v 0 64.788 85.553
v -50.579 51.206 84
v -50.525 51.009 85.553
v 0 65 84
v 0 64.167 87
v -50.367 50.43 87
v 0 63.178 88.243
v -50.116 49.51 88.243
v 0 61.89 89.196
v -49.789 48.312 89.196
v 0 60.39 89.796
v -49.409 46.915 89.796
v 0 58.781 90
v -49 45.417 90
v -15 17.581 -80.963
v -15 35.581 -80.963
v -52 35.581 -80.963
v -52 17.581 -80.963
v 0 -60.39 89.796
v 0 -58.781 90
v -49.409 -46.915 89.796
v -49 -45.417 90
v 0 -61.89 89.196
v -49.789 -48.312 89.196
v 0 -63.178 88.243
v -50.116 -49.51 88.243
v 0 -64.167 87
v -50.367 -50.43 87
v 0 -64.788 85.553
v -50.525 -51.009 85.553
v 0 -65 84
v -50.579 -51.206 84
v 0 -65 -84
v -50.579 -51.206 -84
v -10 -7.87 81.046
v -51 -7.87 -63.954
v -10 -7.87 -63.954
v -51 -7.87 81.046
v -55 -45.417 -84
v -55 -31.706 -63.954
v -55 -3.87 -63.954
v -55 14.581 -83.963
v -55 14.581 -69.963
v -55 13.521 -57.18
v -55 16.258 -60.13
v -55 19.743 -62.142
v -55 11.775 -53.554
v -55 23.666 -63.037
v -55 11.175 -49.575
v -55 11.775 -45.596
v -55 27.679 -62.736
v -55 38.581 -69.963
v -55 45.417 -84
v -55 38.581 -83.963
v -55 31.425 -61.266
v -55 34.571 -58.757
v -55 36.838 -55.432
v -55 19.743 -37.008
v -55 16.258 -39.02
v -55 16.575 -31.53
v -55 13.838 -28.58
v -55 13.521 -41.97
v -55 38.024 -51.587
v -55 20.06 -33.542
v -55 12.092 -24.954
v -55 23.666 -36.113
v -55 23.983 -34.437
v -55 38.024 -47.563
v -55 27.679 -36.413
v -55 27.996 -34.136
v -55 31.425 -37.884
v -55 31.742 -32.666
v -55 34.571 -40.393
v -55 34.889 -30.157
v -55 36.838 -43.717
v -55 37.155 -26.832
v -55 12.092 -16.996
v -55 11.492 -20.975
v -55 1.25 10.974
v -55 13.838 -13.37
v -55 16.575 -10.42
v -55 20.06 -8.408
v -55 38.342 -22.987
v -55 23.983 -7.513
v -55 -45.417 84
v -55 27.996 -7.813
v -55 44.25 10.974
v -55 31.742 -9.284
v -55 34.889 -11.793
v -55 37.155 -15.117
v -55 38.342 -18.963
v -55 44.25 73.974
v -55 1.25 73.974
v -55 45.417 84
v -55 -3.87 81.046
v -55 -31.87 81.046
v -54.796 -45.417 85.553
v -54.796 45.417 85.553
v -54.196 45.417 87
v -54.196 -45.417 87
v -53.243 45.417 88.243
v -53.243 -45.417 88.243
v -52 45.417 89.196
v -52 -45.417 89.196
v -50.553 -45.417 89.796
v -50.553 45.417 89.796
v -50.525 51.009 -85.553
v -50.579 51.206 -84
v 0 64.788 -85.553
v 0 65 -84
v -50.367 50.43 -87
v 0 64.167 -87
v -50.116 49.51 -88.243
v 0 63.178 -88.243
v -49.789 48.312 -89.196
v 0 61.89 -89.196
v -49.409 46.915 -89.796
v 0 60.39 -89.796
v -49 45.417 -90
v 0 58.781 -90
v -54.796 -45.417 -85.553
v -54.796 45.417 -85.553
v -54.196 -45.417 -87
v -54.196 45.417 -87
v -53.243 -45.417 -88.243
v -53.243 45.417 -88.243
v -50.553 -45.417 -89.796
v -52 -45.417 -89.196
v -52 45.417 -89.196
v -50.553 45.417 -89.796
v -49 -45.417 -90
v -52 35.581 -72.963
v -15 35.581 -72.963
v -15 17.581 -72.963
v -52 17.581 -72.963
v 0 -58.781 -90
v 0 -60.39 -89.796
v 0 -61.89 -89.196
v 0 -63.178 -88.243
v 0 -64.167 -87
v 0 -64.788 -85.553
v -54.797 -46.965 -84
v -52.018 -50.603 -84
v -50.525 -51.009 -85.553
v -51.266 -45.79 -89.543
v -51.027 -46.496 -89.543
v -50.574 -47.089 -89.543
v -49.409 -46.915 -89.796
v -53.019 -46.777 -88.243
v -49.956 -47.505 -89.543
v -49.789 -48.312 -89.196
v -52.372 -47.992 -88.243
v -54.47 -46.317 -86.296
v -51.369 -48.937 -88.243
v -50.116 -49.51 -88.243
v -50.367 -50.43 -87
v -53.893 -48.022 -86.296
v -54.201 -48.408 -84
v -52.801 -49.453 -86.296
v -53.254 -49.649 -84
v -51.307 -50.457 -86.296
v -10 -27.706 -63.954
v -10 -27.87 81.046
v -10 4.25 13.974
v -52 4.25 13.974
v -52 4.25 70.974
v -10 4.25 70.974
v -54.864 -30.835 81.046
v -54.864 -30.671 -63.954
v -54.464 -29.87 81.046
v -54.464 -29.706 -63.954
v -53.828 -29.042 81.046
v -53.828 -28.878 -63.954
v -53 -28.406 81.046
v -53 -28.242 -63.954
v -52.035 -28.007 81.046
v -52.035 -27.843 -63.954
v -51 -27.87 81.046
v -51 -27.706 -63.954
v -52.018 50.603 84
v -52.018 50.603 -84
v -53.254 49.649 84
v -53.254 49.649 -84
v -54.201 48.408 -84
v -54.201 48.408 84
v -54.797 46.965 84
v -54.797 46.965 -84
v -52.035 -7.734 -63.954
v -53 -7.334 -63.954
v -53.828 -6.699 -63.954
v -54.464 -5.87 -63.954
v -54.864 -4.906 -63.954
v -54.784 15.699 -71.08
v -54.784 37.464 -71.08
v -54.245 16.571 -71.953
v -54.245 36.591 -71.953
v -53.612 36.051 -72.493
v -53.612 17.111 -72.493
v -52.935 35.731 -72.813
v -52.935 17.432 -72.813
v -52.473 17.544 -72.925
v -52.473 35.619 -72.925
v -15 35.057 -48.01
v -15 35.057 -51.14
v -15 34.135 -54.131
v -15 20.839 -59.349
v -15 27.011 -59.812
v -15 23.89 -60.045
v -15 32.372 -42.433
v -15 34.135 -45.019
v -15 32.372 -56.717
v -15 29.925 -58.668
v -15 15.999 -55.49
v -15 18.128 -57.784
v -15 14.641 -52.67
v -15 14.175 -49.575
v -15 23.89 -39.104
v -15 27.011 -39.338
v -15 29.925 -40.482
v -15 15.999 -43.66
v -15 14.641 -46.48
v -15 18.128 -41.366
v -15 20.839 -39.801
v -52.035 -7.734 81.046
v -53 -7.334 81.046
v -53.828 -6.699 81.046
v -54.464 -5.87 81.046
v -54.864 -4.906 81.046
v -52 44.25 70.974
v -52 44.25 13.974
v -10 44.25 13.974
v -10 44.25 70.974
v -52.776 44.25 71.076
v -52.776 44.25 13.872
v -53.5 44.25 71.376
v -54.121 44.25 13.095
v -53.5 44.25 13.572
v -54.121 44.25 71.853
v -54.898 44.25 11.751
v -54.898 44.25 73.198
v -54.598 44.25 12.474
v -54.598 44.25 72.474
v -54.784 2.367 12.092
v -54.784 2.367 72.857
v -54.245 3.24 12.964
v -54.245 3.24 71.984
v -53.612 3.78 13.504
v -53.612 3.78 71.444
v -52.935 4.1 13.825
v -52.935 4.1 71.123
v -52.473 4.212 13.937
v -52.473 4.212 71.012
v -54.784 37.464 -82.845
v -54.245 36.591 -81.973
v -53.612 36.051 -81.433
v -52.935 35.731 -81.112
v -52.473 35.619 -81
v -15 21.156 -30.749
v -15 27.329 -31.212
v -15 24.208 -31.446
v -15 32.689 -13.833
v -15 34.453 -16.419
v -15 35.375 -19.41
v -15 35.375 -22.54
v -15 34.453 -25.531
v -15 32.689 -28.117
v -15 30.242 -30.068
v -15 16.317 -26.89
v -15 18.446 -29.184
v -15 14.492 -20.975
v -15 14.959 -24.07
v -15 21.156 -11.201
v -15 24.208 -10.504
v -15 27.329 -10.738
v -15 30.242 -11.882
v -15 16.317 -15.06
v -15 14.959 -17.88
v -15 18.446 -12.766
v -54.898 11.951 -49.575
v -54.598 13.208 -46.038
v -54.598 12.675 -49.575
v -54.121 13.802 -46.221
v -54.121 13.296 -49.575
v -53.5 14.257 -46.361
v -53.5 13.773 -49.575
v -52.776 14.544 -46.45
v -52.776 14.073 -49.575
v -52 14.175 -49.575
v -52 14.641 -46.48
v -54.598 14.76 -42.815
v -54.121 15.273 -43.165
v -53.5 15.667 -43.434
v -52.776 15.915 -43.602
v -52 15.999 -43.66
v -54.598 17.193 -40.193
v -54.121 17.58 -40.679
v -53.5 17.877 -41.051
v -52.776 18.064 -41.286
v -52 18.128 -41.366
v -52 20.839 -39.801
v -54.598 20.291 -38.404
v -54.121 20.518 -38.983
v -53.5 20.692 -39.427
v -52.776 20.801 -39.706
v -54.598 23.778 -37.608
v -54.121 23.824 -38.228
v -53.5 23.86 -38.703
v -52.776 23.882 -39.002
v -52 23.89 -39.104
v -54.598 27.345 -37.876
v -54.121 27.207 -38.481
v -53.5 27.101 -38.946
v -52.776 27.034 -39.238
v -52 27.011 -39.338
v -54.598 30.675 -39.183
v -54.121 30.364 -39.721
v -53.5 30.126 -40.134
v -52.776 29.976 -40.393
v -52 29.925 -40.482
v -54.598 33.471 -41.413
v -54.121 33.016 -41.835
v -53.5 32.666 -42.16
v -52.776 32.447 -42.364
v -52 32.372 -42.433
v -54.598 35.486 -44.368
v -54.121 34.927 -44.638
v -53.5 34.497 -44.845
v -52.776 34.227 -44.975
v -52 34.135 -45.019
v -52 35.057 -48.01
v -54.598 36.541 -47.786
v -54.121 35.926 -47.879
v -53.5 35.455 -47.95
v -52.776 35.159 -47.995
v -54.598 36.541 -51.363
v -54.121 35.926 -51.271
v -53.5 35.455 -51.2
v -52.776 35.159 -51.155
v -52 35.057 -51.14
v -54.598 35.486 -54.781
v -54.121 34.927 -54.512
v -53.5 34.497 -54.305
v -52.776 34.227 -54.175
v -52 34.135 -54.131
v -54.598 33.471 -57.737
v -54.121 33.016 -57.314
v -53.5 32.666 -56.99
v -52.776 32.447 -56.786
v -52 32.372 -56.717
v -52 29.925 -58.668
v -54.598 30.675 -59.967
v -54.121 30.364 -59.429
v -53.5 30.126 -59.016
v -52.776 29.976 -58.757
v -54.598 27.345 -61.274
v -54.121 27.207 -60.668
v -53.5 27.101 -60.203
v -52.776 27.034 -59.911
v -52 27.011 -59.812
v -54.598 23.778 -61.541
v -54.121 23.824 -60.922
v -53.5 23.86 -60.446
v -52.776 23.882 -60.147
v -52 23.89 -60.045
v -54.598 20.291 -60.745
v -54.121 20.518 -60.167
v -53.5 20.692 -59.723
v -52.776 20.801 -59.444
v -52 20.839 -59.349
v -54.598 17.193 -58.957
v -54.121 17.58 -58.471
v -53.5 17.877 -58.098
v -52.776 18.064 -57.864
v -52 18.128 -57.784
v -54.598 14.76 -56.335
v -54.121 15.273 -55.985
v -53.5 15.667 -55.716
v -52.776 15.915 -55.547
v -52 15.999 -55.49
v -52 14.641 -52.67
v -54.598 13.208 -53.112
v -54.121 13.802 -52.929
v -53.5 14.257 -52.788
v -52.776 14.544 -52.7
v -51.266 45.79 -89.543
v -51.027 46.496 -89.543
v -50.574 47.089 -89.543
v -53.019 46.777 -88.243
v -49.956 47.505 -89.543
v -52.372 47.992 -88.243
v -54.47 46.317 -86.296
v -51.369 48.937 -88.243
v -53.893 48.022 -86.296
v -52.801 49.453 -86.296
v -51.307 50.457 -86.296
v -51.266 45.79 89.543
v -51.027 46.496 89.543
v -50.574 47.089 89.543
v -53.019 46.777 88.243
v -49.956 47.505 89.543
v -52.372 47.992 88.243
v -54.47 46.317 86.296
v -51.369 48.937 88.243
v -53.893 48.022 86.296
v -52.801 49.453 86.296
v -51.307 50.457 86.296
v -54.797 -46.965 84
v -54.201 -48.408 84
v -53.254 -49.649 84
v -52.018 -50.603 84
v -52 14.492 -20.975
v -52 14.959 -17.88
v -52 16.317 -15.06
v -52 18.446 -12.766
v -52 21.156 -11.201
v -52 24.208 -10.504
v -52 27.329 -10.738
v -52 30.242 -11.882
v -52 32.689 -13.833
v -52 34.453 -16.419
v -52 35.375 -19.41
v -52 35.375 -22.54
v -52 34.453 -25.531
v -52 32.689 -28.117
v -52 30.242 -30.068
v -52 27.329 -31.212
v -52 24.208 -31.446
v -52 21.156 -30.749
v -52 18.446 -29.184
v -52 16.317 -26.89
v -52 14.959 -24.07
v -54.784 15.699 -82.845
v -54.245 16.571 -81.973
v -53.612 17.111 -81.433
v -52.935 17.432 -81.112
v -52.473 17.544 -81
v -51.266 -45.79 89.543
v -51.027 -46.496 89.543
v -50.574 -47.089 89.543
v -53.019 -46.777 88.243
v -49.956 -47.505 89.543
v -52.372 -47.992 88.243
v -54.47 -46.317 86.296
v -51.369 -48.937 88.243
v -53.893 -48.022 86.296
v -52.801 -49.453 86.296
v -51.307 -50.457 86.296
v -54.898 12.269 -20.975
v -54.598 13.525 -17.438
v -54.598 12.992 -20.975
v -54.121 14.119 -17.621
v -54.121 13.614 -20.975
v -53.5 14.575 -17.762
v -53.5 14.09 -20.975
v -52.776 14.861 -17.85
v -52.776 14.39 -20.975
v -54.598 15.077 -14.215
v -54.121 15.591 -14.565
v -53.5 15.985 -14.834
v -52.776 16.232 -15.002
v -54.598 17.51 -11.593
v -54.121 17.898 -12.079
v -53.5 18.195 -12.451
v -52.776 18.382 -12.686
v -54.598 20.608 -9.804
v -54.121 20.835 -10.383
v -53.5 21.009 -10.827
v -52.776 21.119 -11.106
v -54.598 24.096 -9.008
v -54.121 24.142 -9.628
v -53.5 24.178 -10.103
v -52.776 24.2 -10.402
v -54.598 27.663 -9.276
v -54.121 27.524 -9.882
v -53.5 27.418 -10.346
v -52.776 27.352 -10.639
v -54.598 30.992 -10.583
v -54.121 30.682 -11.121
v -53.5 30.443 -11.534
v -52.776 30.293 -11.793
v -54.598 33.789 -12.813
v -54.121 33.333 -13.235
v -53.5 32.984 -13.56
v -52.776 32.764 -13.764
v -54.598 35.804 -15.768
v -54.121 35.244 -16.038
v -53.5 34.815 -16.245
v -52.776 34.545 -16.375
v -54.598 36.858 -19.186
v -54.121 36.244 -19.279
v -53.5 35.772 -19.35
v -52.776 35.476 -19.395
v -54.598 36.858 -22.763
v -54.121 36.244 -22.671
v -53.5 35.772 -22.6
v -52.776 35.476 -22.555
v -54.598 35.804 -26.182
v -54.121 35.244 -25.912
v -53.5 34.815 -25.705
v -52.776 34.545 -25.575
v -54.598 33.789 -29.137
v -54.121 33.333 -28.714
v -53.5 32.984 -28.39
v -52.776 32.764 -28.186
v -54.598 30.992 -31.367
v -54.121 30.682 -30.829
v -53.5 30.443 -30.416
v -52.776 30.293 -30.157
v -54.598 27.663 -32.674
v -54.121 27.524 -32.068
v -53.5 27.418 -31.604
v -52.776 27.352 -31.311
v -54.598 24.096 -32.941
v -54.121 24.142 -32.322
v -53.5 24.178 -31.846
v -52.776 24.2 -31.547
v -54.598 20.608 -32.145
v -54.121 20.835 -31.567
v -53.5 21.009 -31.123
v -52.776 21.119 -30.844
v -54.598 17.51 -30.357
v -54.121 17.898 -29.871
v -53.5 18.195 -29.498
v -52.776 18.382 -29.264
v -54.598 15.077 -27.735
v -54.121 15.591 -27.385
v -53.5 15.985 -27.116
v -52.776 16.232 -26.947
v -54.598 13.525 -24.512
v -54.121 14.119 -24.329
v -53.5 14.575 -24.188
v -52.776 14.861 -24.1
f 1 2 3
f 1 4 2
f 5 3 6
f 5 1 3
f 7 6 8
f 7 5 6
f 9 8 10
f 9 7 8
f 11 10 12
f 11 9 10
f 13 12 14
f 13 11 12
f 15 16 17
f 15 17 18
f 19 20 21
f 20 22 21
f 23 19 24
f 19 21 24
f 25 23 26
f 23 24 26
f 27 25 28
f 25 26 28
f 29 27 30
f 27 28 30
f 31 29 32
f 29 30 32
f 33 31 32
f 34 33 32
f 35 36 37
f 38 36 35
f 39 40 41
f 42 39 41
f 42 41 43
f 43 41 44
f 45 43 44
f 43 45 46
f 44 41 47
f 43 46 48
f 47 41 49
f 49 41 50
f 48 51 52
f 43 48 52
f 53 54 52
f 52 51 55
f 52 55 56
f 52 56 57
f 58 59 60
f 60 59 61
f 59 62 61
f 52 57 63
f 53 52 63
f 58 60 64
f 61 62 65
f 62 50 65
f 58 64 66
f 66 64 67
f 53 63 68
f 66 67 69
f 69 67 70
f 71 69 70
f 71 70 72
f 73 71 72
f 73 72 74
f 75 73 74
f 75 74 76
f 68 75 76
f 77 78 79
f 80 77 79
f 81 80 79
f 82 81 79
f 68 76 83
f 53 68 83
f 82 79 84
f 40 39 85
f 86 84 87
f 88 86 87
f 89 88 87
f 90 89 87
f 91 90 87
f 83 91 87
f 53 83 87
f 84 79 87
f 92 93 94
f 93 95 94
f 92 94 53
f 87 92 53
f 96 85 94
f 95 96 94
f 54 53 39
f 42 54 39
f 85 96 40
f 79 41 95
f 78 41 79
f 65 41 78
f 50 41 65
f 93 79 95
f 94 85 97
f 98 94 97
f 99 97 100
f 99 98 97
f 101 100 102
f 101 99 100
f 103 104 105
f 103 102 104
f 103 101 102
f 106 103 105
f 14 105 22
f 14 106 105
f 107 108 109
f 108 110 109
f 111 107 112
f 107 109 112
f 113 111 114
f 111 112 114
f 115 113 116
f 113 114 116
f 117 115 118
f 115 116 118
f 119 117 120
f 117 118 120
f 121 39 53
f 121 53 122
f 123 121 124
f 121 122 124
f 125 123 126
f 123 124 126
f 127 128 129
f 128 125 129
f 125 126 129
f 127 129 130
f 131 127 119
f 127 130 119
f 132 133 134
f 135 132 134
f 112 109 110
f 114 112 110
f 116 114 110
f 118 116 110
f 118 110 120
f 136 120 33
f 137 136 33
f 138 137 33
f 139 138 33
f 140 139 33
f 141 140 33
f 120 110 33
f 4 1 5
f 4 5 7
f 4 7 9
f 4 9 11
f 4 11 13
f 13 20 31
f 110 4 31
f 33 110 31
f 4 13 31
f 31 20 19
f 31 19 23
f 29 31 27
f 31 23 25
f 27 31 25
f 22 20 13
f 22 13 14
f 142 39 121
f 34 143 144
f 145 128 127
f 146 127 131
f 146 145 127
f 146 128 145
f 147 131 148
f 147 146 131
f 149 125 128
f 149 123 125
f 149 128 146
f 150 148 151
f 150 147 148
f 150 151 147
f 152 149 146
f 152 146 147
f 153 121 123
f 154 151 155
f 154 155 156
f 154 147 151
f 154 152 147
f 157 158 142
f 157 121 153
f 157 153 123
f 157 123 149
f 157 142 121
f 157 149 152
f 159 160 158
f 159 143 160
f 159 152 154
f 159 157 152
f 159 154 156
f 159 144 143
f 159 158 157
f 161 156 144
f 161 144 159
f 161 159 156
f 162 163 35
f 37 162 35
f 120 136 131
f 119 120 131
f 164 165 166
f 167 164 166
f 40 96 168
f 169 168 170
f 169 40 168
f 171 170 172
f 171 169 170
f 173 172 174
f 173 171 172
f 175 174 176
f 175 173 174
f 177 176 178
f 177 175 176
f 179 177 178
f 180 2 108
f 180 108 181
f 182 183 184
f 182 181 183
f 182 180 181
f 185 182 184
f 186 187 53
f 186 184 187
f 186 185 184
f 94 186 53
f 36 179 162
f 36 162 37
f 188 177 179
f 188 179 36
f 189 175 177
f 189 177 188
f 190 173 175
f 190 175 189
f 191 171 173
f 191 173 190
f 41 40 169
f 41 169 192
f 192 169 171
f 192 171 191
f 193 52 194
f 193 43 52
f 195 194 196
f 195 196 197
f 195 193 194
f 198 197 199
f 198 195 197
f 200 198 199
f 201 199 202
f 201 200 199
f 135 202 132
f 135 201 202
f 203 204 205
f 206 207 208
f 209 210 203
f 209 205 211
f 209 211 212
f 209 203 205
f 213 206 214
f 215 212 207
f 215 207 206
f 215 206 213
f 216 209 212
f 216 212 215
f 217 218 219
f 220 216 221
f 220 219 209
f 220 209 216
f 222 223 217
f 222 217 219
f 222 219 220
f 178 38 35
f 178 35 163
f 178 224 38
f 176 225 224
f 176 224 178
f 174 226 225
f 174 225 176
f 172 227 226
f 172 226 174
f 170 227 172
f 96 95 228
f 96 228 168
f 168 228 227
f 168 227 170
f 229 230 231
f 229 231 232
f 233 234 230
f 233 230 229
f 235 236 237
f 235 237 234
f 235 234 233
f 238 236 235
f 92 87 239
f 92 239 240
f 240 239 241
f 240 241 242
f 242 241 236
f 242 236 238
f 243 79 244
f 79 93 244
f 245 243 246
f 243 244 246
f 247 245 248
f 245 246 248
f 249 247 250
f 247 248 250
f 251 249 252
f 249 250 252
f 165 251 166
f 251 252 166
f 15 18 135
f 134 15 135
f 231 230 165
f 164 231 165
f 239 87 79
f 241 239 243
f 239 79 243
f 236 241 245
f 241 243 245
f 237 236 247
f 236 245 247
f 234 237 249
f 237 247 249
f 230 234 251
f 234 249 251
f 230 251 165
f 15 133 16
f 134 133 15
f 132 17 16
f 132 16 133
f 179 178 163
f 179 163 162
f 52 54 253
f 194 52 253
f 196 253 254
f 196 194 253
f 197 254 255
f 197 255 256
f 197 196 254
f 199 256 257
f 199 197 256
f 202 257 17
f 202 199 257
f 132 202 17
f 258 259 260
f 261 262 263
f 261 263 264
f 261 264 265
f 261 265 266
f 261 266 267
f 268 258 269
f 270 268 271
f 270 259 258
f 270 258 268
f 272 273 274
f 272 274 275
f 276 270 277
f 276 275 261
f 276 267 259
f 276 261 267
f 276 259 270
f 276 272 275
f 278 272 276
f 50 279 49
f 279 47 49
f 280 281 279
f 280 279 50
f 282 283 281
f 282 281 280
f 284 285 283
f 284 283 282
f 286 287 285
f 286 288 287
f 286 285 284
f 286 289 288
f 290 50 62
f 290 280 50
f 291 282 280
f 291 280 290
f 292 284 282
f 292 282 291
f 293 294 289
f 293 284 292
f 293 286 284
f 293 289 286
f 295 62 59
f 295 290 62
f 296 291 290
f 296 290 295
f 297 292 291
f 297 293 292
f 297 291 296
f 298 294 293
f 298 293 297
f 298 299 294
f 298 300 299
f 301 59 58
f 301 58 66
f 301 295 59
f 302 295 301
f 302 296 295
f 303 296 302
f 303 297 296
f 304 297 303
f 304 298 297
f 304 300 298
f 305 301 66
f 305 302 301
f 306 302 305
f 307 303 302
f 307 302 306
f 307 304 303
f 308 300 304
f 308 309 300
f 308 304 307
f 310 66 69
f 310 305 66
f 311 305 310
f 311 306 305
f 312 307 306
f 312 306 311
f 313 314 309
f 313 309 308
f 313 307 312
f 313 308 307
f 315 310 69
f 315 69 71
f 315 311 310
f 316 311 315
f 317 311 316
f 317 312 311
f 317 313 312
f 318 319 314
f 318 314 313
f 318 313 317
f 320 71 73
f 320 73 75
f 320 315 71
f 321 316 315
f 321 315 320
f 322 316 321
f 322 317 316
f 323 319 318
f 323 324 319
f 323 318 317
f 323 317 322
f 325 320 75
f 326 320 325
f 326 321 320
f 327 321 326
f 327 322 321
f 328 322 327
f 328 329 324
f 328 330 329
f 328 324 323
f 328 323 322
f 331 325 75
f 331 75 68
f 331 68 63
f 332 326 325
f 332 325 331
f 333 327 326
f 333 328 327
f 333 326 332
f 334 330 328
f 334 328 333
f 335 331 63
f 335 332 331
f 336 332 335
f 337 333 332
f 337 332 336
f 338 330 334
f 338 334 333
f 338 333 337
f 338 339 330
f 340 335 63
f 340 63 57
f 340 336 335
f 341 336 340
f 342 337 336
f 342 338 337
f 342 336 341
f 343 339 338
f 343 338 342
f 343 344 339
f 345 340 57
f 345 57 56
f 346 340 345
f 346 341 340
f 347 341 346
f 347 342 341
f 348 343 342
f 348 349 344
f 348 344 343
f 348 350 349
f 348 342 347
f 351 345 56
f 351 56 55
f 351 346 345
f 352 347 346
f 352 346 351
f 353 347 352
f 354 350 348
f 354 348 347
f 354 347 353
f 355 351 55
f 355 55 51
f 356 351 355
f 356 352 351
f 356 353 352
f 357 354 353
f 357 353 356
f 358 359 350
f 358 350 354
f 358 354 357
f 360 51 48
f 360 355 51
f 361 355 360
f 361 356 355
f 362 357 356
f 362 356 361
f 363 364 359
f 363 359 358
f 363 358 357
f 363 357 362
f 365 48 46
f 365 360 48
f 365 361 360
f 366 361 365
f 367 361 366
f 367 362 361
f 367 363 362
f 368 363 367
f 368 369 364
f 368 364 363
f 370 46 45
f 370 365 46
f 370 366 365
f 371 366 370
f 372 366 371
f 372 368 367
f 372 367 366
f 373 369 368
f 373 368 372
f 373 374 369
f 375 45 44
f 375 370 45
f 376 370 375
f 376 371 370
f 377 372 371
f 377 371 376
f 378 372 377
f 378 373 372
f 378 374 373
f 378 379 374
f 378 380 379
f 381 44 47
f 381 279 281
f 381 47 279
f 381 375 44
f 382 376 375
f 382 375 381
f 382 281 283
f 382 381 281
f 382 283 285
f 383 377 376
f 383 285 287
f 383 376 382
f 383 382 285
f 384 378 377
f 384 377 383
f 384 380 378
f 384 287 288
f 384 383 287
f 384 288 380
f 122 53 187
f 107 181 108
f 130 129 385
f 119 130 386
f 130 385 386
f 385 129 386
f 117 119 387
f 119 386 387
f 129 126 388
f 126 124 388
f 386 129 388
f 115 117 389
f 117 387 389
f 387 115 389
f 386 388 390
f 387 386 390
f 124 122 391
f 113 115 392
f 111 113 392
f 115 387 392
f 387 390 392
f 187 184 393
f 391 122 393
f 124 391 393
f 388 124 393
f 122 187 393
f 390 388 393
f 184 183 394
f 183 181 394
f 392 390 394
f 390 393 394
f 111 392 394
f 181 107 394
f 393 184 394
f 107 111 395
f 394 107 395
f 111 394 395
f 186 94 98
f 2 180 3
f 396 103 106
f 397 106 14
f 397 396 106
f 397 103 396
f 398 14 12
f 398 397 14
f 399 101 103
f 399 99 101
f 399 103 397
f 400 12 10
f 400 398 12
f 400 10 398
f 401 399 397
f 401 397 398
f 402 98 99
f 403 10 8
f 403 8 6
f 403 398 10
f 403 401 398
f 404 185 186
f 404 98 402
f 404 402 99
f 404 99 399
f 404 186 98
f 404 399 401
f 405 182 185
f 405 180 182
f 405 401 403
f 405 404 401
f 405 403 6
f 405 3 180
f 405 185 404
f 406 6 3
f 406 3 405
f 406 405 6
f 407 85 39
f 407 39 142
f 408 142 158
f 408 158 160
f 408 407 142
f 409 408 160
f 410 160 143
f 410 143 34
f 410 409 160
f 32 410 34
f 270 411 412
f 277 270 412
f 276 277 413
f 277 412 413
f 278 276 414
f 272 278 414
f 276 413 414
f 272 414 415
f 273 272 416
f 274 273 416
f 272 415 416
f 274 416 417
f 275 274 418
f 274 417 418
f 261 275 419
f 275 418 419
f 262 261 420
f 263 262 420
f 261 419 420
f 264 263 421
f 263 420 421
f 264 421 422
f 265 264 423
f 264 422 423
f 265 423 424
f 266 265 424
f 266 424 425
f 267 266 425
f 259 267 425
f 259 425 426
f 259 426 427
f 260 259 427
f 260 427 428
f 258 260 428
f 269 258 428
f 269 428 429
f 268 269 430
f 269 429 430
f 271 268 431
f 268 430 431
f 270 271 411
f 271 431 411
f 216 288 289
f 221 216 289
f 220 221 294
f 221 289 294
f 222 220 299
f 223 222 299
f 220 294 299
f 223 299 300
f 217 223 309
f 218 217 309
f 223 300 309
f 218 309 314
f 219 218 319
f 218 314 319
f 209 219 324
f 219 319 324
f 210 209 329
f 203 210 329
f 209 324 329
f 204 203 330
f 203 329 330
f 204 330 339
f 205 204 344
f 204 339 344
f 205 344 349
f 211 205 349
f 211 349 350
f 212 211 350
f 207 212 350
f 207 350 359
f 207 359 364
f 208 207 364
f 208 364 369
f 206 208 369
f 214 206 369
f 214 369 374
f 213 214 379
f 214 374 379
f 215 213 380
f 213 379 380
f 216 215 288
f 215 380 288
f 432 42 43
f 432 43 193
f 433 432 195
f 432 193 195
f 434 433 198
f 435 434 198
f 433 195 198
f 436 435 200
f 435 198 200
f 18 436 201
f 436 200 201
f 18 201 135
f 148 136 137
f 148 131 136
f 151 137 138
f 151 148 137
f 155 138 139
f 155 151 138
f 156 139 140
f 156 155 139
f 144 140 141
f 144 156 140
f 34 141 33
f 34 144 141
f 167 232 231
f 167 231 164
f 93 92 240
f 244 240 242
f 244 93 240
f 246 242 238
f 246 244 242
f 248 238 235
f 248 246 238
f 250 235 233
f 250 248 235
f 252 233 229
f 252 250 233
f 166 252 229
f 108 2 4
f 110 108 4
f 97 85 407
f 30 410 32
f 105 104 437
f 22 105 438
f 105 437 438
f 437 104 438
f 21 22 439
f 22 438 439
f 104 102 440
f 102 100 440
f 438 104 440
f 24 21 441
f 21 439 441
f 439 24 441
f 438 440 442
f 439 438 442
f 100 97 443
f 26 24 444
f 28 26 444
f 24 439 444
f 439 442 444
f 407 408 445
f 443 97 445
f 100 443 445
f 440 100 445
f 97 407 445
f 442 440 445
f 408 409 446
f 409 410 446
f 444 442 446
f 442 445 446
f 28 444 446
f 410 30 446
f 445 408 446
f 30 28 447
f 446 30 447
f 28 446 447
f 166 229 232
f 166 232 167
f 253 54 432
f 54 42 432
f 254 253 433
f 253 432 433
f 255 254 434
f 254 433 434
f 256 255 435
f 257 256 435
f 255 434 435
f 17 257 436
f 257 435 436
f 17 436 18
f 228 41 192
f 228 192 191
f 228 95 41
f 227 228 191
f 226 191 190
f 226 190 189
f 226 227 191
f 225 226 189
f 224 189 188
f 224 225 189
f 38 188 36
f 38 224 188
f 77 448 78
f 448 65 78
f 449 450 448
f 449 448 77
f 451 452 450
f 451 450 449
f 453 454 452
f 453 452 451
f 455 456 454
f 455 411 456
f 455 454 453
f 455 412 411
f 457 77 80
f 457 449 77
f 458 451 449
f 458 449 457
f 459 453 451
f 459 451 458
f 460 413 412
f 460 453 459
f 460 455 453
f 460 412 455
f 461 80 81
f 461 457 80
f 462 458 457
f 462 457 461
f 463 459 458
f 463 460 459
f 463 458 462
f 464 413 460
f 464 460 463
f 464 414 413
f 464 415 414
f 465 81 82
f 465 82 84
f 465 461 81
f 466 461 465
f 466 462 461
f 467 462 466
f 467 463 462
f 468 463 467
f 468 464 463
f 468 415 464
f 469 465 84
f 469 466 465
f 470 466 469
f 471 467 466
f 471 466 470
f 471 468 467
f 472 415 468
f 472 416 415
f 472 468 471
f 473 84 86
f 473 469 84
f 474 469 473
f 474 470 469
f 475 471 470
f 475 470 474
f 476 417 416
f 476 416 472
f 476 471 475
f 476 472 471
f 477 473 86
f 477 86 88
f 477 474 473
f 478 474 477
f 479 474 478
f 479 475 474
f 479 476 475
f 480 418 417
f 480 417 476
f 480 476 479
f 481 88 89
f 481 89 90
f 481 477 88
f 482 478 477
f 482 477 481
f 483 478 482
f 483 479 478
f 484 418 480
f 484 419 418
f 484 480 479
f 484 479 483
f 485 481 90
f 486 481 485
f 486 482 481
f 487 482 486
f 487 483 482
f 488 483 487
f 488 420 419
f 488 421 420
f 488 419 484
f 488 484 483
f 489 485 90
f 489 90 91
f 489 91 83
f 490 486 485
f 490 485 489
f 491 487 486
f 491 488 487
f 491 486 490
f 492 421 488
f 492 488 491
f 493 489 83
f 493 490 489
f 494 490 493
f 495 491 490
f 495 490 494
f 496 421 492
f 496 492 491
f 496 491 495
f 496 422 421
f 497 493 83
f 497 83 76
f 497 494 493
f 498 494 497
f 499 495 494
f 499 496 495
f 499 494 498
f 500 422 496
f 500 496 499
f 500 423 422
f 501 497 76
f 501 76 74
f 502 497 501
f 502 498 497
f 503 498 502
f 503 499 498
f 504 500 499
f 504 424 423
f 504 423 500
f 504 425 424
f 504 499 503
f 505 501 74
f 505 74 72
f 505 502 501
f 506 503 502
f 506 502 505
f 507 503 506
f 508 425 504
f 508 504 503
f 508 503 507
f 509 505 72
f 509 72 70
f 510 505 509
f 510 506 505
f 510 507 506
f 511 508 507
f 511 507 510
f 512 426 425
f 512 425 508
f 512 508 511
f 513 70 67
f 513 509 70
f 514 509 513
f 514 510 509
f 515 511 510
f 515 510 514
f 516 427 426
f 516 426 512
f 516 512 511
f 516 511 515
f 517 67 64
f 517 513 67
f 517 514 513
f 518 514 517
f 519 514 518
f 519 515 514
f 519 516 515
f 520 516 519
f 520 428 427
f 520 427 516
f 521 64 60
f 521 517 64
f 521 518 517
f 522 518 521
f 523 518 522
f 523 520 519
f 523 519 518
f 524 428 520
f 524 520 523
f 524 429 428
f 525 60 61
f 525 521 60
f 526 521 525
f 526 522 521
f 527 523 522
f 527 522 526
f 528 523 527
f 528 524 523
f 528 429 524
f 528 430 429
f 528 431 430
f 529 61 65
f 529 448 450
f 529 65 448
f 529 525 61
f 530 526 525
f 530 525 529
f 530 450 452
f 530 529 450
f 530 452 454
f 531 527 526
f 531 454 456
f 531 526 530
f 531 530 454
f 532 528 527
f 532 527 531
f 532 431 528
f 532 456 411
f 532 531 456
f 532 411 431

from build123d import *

# Parameters (mm, degrees)
PAD_DEPTH       = 90
POCKET_DEPTH    = 45
SKETCH002_W     = 40
SKETCH002_H     = 57
POCKET001_DEPTH = 45
SKETCH003_R     = 10.5
SKETCH003_W     = 18
SKETCH003_H     = 8
POCKET002_DEPTH = 40
FILLET_R        = 6
FILLET001_R     = 3
FILLET002_R     = 4
FILLET003_R     = 3
FILLET004_R     = 3


with BuildPart() as part:
    # Sketch → Pad (new body, symmetric)
    with BuildSketch(Plane.XY):
        Polygon((-55, 50), (0, 65), (0, -65), (-55, -50), align=None)
    extrude(amount=PAD_DEPTH, both=True)

    # Sketch001 (on Face4 of Pad) → Pocket (cut)
    with BuildSketch(Plane(origin=(-55, 0, 0), x_dir=(0, -1, 0), z_dir=(-1, 0, 0))):
        Polygon((7.870361, 81.046063), (27.870361, 81.046063), (27.706422, -63.953844), (7.870361, -63.953844), align=None)
    extrude(amount=-POCKET_DEPTH, mode=Mode.SUBTRACT)

    # Sketch002 (on Face2 of Pocket) → Pocket001 (cut)
    with BuildSketch(Plane(origin=(-55, 0, 0), x_dir=(0, -1, 0), z_dir=(-1, 0, 0))):
        with Locations((-24.249742, 42.474102)):
            Rectangle(SKETCH002_W, SKETCH002_H)
    extrude(amount=-POCKET001_DEPTH, mode=Mode.SUBTRACT)

    # Sketch003 (on Face2 of Pocket001) → Pocket002 (cut)
    with BuildSketch(Plane(origin=(-55, 0, 0), x_dir=(0, -1, 0), z_dir=(-1, 0, 0))):
        with Locations((-24.992333, -20.97492)):
            Circle(SKETCH003_R)
        with Locations((-24.674738, -49.574854)):
            Circle(SKETCH003_R)
        with Locations((-26.581285, -76.962609)):
            Rectangle(SKETCH003_W, SKETCH003_H)
    extrude(amount=-POCKET002_DEPTH, mode=Mode.SUBTRACT)

    # Fillet
    fillet_edges = [part.edges().sort_by_distance(p)[0] for p in [
        (-27.5, -57.5, -90),
        (-27.5, 57.5, -90),
        (-55, 50, 0),
        (-55, -50, 0),
        (-55, 0, -90),
        (-55, 0, 90),
        (-27.5, -57.5, 90),
        (-27.5, 57.5, 90),
    ]]
    fillet(fillet_edges, radius=FILLET_R)

    # Fillet001
    fillet001_edges = [part.edges().sort_by_distance(p)[0] for p in [
        (-55, 35.492333, -20.97492),
        (-55, 35.174738, -49.574854),
    ]]
    fillet(fillet001_edges, radius=FILLET001_R)

    # Fillet002
    fillet002_edges = [part.edges().sort_by_distance(p)[0] for p in [
        (-55, -27.788392, 8.546109),
        (-55, -7.870361, 8.546109),
    ]]
    fillet(fillet002_edges, radius=FILLET002_R)

    # Fillet003
    fillet003_edges = [part.edges().sort_by_distance(p)[0] for p in [
        (-55, 4.249742, 42.474102),
        (-55, 24.249742, 70.974102),
        (-55, 24.249742, 13.974102),
    ]]
    fillet(fillet003_edges, radius=FILLET003_R)

    # Fillet004
    fillet004_edges = [part.edges().sort_by_distance(p)[0] for p in [
        (-55, 26.581285, -72.962609),
        (-55, 35.581285, -76.962609),
        (-55, 17.581285, -76.962609),
        (-55, 26.581285, -80.962609),
    ]]
    fillet(fillet004_edges, radius=FILLET004_R)


solid = part.part
